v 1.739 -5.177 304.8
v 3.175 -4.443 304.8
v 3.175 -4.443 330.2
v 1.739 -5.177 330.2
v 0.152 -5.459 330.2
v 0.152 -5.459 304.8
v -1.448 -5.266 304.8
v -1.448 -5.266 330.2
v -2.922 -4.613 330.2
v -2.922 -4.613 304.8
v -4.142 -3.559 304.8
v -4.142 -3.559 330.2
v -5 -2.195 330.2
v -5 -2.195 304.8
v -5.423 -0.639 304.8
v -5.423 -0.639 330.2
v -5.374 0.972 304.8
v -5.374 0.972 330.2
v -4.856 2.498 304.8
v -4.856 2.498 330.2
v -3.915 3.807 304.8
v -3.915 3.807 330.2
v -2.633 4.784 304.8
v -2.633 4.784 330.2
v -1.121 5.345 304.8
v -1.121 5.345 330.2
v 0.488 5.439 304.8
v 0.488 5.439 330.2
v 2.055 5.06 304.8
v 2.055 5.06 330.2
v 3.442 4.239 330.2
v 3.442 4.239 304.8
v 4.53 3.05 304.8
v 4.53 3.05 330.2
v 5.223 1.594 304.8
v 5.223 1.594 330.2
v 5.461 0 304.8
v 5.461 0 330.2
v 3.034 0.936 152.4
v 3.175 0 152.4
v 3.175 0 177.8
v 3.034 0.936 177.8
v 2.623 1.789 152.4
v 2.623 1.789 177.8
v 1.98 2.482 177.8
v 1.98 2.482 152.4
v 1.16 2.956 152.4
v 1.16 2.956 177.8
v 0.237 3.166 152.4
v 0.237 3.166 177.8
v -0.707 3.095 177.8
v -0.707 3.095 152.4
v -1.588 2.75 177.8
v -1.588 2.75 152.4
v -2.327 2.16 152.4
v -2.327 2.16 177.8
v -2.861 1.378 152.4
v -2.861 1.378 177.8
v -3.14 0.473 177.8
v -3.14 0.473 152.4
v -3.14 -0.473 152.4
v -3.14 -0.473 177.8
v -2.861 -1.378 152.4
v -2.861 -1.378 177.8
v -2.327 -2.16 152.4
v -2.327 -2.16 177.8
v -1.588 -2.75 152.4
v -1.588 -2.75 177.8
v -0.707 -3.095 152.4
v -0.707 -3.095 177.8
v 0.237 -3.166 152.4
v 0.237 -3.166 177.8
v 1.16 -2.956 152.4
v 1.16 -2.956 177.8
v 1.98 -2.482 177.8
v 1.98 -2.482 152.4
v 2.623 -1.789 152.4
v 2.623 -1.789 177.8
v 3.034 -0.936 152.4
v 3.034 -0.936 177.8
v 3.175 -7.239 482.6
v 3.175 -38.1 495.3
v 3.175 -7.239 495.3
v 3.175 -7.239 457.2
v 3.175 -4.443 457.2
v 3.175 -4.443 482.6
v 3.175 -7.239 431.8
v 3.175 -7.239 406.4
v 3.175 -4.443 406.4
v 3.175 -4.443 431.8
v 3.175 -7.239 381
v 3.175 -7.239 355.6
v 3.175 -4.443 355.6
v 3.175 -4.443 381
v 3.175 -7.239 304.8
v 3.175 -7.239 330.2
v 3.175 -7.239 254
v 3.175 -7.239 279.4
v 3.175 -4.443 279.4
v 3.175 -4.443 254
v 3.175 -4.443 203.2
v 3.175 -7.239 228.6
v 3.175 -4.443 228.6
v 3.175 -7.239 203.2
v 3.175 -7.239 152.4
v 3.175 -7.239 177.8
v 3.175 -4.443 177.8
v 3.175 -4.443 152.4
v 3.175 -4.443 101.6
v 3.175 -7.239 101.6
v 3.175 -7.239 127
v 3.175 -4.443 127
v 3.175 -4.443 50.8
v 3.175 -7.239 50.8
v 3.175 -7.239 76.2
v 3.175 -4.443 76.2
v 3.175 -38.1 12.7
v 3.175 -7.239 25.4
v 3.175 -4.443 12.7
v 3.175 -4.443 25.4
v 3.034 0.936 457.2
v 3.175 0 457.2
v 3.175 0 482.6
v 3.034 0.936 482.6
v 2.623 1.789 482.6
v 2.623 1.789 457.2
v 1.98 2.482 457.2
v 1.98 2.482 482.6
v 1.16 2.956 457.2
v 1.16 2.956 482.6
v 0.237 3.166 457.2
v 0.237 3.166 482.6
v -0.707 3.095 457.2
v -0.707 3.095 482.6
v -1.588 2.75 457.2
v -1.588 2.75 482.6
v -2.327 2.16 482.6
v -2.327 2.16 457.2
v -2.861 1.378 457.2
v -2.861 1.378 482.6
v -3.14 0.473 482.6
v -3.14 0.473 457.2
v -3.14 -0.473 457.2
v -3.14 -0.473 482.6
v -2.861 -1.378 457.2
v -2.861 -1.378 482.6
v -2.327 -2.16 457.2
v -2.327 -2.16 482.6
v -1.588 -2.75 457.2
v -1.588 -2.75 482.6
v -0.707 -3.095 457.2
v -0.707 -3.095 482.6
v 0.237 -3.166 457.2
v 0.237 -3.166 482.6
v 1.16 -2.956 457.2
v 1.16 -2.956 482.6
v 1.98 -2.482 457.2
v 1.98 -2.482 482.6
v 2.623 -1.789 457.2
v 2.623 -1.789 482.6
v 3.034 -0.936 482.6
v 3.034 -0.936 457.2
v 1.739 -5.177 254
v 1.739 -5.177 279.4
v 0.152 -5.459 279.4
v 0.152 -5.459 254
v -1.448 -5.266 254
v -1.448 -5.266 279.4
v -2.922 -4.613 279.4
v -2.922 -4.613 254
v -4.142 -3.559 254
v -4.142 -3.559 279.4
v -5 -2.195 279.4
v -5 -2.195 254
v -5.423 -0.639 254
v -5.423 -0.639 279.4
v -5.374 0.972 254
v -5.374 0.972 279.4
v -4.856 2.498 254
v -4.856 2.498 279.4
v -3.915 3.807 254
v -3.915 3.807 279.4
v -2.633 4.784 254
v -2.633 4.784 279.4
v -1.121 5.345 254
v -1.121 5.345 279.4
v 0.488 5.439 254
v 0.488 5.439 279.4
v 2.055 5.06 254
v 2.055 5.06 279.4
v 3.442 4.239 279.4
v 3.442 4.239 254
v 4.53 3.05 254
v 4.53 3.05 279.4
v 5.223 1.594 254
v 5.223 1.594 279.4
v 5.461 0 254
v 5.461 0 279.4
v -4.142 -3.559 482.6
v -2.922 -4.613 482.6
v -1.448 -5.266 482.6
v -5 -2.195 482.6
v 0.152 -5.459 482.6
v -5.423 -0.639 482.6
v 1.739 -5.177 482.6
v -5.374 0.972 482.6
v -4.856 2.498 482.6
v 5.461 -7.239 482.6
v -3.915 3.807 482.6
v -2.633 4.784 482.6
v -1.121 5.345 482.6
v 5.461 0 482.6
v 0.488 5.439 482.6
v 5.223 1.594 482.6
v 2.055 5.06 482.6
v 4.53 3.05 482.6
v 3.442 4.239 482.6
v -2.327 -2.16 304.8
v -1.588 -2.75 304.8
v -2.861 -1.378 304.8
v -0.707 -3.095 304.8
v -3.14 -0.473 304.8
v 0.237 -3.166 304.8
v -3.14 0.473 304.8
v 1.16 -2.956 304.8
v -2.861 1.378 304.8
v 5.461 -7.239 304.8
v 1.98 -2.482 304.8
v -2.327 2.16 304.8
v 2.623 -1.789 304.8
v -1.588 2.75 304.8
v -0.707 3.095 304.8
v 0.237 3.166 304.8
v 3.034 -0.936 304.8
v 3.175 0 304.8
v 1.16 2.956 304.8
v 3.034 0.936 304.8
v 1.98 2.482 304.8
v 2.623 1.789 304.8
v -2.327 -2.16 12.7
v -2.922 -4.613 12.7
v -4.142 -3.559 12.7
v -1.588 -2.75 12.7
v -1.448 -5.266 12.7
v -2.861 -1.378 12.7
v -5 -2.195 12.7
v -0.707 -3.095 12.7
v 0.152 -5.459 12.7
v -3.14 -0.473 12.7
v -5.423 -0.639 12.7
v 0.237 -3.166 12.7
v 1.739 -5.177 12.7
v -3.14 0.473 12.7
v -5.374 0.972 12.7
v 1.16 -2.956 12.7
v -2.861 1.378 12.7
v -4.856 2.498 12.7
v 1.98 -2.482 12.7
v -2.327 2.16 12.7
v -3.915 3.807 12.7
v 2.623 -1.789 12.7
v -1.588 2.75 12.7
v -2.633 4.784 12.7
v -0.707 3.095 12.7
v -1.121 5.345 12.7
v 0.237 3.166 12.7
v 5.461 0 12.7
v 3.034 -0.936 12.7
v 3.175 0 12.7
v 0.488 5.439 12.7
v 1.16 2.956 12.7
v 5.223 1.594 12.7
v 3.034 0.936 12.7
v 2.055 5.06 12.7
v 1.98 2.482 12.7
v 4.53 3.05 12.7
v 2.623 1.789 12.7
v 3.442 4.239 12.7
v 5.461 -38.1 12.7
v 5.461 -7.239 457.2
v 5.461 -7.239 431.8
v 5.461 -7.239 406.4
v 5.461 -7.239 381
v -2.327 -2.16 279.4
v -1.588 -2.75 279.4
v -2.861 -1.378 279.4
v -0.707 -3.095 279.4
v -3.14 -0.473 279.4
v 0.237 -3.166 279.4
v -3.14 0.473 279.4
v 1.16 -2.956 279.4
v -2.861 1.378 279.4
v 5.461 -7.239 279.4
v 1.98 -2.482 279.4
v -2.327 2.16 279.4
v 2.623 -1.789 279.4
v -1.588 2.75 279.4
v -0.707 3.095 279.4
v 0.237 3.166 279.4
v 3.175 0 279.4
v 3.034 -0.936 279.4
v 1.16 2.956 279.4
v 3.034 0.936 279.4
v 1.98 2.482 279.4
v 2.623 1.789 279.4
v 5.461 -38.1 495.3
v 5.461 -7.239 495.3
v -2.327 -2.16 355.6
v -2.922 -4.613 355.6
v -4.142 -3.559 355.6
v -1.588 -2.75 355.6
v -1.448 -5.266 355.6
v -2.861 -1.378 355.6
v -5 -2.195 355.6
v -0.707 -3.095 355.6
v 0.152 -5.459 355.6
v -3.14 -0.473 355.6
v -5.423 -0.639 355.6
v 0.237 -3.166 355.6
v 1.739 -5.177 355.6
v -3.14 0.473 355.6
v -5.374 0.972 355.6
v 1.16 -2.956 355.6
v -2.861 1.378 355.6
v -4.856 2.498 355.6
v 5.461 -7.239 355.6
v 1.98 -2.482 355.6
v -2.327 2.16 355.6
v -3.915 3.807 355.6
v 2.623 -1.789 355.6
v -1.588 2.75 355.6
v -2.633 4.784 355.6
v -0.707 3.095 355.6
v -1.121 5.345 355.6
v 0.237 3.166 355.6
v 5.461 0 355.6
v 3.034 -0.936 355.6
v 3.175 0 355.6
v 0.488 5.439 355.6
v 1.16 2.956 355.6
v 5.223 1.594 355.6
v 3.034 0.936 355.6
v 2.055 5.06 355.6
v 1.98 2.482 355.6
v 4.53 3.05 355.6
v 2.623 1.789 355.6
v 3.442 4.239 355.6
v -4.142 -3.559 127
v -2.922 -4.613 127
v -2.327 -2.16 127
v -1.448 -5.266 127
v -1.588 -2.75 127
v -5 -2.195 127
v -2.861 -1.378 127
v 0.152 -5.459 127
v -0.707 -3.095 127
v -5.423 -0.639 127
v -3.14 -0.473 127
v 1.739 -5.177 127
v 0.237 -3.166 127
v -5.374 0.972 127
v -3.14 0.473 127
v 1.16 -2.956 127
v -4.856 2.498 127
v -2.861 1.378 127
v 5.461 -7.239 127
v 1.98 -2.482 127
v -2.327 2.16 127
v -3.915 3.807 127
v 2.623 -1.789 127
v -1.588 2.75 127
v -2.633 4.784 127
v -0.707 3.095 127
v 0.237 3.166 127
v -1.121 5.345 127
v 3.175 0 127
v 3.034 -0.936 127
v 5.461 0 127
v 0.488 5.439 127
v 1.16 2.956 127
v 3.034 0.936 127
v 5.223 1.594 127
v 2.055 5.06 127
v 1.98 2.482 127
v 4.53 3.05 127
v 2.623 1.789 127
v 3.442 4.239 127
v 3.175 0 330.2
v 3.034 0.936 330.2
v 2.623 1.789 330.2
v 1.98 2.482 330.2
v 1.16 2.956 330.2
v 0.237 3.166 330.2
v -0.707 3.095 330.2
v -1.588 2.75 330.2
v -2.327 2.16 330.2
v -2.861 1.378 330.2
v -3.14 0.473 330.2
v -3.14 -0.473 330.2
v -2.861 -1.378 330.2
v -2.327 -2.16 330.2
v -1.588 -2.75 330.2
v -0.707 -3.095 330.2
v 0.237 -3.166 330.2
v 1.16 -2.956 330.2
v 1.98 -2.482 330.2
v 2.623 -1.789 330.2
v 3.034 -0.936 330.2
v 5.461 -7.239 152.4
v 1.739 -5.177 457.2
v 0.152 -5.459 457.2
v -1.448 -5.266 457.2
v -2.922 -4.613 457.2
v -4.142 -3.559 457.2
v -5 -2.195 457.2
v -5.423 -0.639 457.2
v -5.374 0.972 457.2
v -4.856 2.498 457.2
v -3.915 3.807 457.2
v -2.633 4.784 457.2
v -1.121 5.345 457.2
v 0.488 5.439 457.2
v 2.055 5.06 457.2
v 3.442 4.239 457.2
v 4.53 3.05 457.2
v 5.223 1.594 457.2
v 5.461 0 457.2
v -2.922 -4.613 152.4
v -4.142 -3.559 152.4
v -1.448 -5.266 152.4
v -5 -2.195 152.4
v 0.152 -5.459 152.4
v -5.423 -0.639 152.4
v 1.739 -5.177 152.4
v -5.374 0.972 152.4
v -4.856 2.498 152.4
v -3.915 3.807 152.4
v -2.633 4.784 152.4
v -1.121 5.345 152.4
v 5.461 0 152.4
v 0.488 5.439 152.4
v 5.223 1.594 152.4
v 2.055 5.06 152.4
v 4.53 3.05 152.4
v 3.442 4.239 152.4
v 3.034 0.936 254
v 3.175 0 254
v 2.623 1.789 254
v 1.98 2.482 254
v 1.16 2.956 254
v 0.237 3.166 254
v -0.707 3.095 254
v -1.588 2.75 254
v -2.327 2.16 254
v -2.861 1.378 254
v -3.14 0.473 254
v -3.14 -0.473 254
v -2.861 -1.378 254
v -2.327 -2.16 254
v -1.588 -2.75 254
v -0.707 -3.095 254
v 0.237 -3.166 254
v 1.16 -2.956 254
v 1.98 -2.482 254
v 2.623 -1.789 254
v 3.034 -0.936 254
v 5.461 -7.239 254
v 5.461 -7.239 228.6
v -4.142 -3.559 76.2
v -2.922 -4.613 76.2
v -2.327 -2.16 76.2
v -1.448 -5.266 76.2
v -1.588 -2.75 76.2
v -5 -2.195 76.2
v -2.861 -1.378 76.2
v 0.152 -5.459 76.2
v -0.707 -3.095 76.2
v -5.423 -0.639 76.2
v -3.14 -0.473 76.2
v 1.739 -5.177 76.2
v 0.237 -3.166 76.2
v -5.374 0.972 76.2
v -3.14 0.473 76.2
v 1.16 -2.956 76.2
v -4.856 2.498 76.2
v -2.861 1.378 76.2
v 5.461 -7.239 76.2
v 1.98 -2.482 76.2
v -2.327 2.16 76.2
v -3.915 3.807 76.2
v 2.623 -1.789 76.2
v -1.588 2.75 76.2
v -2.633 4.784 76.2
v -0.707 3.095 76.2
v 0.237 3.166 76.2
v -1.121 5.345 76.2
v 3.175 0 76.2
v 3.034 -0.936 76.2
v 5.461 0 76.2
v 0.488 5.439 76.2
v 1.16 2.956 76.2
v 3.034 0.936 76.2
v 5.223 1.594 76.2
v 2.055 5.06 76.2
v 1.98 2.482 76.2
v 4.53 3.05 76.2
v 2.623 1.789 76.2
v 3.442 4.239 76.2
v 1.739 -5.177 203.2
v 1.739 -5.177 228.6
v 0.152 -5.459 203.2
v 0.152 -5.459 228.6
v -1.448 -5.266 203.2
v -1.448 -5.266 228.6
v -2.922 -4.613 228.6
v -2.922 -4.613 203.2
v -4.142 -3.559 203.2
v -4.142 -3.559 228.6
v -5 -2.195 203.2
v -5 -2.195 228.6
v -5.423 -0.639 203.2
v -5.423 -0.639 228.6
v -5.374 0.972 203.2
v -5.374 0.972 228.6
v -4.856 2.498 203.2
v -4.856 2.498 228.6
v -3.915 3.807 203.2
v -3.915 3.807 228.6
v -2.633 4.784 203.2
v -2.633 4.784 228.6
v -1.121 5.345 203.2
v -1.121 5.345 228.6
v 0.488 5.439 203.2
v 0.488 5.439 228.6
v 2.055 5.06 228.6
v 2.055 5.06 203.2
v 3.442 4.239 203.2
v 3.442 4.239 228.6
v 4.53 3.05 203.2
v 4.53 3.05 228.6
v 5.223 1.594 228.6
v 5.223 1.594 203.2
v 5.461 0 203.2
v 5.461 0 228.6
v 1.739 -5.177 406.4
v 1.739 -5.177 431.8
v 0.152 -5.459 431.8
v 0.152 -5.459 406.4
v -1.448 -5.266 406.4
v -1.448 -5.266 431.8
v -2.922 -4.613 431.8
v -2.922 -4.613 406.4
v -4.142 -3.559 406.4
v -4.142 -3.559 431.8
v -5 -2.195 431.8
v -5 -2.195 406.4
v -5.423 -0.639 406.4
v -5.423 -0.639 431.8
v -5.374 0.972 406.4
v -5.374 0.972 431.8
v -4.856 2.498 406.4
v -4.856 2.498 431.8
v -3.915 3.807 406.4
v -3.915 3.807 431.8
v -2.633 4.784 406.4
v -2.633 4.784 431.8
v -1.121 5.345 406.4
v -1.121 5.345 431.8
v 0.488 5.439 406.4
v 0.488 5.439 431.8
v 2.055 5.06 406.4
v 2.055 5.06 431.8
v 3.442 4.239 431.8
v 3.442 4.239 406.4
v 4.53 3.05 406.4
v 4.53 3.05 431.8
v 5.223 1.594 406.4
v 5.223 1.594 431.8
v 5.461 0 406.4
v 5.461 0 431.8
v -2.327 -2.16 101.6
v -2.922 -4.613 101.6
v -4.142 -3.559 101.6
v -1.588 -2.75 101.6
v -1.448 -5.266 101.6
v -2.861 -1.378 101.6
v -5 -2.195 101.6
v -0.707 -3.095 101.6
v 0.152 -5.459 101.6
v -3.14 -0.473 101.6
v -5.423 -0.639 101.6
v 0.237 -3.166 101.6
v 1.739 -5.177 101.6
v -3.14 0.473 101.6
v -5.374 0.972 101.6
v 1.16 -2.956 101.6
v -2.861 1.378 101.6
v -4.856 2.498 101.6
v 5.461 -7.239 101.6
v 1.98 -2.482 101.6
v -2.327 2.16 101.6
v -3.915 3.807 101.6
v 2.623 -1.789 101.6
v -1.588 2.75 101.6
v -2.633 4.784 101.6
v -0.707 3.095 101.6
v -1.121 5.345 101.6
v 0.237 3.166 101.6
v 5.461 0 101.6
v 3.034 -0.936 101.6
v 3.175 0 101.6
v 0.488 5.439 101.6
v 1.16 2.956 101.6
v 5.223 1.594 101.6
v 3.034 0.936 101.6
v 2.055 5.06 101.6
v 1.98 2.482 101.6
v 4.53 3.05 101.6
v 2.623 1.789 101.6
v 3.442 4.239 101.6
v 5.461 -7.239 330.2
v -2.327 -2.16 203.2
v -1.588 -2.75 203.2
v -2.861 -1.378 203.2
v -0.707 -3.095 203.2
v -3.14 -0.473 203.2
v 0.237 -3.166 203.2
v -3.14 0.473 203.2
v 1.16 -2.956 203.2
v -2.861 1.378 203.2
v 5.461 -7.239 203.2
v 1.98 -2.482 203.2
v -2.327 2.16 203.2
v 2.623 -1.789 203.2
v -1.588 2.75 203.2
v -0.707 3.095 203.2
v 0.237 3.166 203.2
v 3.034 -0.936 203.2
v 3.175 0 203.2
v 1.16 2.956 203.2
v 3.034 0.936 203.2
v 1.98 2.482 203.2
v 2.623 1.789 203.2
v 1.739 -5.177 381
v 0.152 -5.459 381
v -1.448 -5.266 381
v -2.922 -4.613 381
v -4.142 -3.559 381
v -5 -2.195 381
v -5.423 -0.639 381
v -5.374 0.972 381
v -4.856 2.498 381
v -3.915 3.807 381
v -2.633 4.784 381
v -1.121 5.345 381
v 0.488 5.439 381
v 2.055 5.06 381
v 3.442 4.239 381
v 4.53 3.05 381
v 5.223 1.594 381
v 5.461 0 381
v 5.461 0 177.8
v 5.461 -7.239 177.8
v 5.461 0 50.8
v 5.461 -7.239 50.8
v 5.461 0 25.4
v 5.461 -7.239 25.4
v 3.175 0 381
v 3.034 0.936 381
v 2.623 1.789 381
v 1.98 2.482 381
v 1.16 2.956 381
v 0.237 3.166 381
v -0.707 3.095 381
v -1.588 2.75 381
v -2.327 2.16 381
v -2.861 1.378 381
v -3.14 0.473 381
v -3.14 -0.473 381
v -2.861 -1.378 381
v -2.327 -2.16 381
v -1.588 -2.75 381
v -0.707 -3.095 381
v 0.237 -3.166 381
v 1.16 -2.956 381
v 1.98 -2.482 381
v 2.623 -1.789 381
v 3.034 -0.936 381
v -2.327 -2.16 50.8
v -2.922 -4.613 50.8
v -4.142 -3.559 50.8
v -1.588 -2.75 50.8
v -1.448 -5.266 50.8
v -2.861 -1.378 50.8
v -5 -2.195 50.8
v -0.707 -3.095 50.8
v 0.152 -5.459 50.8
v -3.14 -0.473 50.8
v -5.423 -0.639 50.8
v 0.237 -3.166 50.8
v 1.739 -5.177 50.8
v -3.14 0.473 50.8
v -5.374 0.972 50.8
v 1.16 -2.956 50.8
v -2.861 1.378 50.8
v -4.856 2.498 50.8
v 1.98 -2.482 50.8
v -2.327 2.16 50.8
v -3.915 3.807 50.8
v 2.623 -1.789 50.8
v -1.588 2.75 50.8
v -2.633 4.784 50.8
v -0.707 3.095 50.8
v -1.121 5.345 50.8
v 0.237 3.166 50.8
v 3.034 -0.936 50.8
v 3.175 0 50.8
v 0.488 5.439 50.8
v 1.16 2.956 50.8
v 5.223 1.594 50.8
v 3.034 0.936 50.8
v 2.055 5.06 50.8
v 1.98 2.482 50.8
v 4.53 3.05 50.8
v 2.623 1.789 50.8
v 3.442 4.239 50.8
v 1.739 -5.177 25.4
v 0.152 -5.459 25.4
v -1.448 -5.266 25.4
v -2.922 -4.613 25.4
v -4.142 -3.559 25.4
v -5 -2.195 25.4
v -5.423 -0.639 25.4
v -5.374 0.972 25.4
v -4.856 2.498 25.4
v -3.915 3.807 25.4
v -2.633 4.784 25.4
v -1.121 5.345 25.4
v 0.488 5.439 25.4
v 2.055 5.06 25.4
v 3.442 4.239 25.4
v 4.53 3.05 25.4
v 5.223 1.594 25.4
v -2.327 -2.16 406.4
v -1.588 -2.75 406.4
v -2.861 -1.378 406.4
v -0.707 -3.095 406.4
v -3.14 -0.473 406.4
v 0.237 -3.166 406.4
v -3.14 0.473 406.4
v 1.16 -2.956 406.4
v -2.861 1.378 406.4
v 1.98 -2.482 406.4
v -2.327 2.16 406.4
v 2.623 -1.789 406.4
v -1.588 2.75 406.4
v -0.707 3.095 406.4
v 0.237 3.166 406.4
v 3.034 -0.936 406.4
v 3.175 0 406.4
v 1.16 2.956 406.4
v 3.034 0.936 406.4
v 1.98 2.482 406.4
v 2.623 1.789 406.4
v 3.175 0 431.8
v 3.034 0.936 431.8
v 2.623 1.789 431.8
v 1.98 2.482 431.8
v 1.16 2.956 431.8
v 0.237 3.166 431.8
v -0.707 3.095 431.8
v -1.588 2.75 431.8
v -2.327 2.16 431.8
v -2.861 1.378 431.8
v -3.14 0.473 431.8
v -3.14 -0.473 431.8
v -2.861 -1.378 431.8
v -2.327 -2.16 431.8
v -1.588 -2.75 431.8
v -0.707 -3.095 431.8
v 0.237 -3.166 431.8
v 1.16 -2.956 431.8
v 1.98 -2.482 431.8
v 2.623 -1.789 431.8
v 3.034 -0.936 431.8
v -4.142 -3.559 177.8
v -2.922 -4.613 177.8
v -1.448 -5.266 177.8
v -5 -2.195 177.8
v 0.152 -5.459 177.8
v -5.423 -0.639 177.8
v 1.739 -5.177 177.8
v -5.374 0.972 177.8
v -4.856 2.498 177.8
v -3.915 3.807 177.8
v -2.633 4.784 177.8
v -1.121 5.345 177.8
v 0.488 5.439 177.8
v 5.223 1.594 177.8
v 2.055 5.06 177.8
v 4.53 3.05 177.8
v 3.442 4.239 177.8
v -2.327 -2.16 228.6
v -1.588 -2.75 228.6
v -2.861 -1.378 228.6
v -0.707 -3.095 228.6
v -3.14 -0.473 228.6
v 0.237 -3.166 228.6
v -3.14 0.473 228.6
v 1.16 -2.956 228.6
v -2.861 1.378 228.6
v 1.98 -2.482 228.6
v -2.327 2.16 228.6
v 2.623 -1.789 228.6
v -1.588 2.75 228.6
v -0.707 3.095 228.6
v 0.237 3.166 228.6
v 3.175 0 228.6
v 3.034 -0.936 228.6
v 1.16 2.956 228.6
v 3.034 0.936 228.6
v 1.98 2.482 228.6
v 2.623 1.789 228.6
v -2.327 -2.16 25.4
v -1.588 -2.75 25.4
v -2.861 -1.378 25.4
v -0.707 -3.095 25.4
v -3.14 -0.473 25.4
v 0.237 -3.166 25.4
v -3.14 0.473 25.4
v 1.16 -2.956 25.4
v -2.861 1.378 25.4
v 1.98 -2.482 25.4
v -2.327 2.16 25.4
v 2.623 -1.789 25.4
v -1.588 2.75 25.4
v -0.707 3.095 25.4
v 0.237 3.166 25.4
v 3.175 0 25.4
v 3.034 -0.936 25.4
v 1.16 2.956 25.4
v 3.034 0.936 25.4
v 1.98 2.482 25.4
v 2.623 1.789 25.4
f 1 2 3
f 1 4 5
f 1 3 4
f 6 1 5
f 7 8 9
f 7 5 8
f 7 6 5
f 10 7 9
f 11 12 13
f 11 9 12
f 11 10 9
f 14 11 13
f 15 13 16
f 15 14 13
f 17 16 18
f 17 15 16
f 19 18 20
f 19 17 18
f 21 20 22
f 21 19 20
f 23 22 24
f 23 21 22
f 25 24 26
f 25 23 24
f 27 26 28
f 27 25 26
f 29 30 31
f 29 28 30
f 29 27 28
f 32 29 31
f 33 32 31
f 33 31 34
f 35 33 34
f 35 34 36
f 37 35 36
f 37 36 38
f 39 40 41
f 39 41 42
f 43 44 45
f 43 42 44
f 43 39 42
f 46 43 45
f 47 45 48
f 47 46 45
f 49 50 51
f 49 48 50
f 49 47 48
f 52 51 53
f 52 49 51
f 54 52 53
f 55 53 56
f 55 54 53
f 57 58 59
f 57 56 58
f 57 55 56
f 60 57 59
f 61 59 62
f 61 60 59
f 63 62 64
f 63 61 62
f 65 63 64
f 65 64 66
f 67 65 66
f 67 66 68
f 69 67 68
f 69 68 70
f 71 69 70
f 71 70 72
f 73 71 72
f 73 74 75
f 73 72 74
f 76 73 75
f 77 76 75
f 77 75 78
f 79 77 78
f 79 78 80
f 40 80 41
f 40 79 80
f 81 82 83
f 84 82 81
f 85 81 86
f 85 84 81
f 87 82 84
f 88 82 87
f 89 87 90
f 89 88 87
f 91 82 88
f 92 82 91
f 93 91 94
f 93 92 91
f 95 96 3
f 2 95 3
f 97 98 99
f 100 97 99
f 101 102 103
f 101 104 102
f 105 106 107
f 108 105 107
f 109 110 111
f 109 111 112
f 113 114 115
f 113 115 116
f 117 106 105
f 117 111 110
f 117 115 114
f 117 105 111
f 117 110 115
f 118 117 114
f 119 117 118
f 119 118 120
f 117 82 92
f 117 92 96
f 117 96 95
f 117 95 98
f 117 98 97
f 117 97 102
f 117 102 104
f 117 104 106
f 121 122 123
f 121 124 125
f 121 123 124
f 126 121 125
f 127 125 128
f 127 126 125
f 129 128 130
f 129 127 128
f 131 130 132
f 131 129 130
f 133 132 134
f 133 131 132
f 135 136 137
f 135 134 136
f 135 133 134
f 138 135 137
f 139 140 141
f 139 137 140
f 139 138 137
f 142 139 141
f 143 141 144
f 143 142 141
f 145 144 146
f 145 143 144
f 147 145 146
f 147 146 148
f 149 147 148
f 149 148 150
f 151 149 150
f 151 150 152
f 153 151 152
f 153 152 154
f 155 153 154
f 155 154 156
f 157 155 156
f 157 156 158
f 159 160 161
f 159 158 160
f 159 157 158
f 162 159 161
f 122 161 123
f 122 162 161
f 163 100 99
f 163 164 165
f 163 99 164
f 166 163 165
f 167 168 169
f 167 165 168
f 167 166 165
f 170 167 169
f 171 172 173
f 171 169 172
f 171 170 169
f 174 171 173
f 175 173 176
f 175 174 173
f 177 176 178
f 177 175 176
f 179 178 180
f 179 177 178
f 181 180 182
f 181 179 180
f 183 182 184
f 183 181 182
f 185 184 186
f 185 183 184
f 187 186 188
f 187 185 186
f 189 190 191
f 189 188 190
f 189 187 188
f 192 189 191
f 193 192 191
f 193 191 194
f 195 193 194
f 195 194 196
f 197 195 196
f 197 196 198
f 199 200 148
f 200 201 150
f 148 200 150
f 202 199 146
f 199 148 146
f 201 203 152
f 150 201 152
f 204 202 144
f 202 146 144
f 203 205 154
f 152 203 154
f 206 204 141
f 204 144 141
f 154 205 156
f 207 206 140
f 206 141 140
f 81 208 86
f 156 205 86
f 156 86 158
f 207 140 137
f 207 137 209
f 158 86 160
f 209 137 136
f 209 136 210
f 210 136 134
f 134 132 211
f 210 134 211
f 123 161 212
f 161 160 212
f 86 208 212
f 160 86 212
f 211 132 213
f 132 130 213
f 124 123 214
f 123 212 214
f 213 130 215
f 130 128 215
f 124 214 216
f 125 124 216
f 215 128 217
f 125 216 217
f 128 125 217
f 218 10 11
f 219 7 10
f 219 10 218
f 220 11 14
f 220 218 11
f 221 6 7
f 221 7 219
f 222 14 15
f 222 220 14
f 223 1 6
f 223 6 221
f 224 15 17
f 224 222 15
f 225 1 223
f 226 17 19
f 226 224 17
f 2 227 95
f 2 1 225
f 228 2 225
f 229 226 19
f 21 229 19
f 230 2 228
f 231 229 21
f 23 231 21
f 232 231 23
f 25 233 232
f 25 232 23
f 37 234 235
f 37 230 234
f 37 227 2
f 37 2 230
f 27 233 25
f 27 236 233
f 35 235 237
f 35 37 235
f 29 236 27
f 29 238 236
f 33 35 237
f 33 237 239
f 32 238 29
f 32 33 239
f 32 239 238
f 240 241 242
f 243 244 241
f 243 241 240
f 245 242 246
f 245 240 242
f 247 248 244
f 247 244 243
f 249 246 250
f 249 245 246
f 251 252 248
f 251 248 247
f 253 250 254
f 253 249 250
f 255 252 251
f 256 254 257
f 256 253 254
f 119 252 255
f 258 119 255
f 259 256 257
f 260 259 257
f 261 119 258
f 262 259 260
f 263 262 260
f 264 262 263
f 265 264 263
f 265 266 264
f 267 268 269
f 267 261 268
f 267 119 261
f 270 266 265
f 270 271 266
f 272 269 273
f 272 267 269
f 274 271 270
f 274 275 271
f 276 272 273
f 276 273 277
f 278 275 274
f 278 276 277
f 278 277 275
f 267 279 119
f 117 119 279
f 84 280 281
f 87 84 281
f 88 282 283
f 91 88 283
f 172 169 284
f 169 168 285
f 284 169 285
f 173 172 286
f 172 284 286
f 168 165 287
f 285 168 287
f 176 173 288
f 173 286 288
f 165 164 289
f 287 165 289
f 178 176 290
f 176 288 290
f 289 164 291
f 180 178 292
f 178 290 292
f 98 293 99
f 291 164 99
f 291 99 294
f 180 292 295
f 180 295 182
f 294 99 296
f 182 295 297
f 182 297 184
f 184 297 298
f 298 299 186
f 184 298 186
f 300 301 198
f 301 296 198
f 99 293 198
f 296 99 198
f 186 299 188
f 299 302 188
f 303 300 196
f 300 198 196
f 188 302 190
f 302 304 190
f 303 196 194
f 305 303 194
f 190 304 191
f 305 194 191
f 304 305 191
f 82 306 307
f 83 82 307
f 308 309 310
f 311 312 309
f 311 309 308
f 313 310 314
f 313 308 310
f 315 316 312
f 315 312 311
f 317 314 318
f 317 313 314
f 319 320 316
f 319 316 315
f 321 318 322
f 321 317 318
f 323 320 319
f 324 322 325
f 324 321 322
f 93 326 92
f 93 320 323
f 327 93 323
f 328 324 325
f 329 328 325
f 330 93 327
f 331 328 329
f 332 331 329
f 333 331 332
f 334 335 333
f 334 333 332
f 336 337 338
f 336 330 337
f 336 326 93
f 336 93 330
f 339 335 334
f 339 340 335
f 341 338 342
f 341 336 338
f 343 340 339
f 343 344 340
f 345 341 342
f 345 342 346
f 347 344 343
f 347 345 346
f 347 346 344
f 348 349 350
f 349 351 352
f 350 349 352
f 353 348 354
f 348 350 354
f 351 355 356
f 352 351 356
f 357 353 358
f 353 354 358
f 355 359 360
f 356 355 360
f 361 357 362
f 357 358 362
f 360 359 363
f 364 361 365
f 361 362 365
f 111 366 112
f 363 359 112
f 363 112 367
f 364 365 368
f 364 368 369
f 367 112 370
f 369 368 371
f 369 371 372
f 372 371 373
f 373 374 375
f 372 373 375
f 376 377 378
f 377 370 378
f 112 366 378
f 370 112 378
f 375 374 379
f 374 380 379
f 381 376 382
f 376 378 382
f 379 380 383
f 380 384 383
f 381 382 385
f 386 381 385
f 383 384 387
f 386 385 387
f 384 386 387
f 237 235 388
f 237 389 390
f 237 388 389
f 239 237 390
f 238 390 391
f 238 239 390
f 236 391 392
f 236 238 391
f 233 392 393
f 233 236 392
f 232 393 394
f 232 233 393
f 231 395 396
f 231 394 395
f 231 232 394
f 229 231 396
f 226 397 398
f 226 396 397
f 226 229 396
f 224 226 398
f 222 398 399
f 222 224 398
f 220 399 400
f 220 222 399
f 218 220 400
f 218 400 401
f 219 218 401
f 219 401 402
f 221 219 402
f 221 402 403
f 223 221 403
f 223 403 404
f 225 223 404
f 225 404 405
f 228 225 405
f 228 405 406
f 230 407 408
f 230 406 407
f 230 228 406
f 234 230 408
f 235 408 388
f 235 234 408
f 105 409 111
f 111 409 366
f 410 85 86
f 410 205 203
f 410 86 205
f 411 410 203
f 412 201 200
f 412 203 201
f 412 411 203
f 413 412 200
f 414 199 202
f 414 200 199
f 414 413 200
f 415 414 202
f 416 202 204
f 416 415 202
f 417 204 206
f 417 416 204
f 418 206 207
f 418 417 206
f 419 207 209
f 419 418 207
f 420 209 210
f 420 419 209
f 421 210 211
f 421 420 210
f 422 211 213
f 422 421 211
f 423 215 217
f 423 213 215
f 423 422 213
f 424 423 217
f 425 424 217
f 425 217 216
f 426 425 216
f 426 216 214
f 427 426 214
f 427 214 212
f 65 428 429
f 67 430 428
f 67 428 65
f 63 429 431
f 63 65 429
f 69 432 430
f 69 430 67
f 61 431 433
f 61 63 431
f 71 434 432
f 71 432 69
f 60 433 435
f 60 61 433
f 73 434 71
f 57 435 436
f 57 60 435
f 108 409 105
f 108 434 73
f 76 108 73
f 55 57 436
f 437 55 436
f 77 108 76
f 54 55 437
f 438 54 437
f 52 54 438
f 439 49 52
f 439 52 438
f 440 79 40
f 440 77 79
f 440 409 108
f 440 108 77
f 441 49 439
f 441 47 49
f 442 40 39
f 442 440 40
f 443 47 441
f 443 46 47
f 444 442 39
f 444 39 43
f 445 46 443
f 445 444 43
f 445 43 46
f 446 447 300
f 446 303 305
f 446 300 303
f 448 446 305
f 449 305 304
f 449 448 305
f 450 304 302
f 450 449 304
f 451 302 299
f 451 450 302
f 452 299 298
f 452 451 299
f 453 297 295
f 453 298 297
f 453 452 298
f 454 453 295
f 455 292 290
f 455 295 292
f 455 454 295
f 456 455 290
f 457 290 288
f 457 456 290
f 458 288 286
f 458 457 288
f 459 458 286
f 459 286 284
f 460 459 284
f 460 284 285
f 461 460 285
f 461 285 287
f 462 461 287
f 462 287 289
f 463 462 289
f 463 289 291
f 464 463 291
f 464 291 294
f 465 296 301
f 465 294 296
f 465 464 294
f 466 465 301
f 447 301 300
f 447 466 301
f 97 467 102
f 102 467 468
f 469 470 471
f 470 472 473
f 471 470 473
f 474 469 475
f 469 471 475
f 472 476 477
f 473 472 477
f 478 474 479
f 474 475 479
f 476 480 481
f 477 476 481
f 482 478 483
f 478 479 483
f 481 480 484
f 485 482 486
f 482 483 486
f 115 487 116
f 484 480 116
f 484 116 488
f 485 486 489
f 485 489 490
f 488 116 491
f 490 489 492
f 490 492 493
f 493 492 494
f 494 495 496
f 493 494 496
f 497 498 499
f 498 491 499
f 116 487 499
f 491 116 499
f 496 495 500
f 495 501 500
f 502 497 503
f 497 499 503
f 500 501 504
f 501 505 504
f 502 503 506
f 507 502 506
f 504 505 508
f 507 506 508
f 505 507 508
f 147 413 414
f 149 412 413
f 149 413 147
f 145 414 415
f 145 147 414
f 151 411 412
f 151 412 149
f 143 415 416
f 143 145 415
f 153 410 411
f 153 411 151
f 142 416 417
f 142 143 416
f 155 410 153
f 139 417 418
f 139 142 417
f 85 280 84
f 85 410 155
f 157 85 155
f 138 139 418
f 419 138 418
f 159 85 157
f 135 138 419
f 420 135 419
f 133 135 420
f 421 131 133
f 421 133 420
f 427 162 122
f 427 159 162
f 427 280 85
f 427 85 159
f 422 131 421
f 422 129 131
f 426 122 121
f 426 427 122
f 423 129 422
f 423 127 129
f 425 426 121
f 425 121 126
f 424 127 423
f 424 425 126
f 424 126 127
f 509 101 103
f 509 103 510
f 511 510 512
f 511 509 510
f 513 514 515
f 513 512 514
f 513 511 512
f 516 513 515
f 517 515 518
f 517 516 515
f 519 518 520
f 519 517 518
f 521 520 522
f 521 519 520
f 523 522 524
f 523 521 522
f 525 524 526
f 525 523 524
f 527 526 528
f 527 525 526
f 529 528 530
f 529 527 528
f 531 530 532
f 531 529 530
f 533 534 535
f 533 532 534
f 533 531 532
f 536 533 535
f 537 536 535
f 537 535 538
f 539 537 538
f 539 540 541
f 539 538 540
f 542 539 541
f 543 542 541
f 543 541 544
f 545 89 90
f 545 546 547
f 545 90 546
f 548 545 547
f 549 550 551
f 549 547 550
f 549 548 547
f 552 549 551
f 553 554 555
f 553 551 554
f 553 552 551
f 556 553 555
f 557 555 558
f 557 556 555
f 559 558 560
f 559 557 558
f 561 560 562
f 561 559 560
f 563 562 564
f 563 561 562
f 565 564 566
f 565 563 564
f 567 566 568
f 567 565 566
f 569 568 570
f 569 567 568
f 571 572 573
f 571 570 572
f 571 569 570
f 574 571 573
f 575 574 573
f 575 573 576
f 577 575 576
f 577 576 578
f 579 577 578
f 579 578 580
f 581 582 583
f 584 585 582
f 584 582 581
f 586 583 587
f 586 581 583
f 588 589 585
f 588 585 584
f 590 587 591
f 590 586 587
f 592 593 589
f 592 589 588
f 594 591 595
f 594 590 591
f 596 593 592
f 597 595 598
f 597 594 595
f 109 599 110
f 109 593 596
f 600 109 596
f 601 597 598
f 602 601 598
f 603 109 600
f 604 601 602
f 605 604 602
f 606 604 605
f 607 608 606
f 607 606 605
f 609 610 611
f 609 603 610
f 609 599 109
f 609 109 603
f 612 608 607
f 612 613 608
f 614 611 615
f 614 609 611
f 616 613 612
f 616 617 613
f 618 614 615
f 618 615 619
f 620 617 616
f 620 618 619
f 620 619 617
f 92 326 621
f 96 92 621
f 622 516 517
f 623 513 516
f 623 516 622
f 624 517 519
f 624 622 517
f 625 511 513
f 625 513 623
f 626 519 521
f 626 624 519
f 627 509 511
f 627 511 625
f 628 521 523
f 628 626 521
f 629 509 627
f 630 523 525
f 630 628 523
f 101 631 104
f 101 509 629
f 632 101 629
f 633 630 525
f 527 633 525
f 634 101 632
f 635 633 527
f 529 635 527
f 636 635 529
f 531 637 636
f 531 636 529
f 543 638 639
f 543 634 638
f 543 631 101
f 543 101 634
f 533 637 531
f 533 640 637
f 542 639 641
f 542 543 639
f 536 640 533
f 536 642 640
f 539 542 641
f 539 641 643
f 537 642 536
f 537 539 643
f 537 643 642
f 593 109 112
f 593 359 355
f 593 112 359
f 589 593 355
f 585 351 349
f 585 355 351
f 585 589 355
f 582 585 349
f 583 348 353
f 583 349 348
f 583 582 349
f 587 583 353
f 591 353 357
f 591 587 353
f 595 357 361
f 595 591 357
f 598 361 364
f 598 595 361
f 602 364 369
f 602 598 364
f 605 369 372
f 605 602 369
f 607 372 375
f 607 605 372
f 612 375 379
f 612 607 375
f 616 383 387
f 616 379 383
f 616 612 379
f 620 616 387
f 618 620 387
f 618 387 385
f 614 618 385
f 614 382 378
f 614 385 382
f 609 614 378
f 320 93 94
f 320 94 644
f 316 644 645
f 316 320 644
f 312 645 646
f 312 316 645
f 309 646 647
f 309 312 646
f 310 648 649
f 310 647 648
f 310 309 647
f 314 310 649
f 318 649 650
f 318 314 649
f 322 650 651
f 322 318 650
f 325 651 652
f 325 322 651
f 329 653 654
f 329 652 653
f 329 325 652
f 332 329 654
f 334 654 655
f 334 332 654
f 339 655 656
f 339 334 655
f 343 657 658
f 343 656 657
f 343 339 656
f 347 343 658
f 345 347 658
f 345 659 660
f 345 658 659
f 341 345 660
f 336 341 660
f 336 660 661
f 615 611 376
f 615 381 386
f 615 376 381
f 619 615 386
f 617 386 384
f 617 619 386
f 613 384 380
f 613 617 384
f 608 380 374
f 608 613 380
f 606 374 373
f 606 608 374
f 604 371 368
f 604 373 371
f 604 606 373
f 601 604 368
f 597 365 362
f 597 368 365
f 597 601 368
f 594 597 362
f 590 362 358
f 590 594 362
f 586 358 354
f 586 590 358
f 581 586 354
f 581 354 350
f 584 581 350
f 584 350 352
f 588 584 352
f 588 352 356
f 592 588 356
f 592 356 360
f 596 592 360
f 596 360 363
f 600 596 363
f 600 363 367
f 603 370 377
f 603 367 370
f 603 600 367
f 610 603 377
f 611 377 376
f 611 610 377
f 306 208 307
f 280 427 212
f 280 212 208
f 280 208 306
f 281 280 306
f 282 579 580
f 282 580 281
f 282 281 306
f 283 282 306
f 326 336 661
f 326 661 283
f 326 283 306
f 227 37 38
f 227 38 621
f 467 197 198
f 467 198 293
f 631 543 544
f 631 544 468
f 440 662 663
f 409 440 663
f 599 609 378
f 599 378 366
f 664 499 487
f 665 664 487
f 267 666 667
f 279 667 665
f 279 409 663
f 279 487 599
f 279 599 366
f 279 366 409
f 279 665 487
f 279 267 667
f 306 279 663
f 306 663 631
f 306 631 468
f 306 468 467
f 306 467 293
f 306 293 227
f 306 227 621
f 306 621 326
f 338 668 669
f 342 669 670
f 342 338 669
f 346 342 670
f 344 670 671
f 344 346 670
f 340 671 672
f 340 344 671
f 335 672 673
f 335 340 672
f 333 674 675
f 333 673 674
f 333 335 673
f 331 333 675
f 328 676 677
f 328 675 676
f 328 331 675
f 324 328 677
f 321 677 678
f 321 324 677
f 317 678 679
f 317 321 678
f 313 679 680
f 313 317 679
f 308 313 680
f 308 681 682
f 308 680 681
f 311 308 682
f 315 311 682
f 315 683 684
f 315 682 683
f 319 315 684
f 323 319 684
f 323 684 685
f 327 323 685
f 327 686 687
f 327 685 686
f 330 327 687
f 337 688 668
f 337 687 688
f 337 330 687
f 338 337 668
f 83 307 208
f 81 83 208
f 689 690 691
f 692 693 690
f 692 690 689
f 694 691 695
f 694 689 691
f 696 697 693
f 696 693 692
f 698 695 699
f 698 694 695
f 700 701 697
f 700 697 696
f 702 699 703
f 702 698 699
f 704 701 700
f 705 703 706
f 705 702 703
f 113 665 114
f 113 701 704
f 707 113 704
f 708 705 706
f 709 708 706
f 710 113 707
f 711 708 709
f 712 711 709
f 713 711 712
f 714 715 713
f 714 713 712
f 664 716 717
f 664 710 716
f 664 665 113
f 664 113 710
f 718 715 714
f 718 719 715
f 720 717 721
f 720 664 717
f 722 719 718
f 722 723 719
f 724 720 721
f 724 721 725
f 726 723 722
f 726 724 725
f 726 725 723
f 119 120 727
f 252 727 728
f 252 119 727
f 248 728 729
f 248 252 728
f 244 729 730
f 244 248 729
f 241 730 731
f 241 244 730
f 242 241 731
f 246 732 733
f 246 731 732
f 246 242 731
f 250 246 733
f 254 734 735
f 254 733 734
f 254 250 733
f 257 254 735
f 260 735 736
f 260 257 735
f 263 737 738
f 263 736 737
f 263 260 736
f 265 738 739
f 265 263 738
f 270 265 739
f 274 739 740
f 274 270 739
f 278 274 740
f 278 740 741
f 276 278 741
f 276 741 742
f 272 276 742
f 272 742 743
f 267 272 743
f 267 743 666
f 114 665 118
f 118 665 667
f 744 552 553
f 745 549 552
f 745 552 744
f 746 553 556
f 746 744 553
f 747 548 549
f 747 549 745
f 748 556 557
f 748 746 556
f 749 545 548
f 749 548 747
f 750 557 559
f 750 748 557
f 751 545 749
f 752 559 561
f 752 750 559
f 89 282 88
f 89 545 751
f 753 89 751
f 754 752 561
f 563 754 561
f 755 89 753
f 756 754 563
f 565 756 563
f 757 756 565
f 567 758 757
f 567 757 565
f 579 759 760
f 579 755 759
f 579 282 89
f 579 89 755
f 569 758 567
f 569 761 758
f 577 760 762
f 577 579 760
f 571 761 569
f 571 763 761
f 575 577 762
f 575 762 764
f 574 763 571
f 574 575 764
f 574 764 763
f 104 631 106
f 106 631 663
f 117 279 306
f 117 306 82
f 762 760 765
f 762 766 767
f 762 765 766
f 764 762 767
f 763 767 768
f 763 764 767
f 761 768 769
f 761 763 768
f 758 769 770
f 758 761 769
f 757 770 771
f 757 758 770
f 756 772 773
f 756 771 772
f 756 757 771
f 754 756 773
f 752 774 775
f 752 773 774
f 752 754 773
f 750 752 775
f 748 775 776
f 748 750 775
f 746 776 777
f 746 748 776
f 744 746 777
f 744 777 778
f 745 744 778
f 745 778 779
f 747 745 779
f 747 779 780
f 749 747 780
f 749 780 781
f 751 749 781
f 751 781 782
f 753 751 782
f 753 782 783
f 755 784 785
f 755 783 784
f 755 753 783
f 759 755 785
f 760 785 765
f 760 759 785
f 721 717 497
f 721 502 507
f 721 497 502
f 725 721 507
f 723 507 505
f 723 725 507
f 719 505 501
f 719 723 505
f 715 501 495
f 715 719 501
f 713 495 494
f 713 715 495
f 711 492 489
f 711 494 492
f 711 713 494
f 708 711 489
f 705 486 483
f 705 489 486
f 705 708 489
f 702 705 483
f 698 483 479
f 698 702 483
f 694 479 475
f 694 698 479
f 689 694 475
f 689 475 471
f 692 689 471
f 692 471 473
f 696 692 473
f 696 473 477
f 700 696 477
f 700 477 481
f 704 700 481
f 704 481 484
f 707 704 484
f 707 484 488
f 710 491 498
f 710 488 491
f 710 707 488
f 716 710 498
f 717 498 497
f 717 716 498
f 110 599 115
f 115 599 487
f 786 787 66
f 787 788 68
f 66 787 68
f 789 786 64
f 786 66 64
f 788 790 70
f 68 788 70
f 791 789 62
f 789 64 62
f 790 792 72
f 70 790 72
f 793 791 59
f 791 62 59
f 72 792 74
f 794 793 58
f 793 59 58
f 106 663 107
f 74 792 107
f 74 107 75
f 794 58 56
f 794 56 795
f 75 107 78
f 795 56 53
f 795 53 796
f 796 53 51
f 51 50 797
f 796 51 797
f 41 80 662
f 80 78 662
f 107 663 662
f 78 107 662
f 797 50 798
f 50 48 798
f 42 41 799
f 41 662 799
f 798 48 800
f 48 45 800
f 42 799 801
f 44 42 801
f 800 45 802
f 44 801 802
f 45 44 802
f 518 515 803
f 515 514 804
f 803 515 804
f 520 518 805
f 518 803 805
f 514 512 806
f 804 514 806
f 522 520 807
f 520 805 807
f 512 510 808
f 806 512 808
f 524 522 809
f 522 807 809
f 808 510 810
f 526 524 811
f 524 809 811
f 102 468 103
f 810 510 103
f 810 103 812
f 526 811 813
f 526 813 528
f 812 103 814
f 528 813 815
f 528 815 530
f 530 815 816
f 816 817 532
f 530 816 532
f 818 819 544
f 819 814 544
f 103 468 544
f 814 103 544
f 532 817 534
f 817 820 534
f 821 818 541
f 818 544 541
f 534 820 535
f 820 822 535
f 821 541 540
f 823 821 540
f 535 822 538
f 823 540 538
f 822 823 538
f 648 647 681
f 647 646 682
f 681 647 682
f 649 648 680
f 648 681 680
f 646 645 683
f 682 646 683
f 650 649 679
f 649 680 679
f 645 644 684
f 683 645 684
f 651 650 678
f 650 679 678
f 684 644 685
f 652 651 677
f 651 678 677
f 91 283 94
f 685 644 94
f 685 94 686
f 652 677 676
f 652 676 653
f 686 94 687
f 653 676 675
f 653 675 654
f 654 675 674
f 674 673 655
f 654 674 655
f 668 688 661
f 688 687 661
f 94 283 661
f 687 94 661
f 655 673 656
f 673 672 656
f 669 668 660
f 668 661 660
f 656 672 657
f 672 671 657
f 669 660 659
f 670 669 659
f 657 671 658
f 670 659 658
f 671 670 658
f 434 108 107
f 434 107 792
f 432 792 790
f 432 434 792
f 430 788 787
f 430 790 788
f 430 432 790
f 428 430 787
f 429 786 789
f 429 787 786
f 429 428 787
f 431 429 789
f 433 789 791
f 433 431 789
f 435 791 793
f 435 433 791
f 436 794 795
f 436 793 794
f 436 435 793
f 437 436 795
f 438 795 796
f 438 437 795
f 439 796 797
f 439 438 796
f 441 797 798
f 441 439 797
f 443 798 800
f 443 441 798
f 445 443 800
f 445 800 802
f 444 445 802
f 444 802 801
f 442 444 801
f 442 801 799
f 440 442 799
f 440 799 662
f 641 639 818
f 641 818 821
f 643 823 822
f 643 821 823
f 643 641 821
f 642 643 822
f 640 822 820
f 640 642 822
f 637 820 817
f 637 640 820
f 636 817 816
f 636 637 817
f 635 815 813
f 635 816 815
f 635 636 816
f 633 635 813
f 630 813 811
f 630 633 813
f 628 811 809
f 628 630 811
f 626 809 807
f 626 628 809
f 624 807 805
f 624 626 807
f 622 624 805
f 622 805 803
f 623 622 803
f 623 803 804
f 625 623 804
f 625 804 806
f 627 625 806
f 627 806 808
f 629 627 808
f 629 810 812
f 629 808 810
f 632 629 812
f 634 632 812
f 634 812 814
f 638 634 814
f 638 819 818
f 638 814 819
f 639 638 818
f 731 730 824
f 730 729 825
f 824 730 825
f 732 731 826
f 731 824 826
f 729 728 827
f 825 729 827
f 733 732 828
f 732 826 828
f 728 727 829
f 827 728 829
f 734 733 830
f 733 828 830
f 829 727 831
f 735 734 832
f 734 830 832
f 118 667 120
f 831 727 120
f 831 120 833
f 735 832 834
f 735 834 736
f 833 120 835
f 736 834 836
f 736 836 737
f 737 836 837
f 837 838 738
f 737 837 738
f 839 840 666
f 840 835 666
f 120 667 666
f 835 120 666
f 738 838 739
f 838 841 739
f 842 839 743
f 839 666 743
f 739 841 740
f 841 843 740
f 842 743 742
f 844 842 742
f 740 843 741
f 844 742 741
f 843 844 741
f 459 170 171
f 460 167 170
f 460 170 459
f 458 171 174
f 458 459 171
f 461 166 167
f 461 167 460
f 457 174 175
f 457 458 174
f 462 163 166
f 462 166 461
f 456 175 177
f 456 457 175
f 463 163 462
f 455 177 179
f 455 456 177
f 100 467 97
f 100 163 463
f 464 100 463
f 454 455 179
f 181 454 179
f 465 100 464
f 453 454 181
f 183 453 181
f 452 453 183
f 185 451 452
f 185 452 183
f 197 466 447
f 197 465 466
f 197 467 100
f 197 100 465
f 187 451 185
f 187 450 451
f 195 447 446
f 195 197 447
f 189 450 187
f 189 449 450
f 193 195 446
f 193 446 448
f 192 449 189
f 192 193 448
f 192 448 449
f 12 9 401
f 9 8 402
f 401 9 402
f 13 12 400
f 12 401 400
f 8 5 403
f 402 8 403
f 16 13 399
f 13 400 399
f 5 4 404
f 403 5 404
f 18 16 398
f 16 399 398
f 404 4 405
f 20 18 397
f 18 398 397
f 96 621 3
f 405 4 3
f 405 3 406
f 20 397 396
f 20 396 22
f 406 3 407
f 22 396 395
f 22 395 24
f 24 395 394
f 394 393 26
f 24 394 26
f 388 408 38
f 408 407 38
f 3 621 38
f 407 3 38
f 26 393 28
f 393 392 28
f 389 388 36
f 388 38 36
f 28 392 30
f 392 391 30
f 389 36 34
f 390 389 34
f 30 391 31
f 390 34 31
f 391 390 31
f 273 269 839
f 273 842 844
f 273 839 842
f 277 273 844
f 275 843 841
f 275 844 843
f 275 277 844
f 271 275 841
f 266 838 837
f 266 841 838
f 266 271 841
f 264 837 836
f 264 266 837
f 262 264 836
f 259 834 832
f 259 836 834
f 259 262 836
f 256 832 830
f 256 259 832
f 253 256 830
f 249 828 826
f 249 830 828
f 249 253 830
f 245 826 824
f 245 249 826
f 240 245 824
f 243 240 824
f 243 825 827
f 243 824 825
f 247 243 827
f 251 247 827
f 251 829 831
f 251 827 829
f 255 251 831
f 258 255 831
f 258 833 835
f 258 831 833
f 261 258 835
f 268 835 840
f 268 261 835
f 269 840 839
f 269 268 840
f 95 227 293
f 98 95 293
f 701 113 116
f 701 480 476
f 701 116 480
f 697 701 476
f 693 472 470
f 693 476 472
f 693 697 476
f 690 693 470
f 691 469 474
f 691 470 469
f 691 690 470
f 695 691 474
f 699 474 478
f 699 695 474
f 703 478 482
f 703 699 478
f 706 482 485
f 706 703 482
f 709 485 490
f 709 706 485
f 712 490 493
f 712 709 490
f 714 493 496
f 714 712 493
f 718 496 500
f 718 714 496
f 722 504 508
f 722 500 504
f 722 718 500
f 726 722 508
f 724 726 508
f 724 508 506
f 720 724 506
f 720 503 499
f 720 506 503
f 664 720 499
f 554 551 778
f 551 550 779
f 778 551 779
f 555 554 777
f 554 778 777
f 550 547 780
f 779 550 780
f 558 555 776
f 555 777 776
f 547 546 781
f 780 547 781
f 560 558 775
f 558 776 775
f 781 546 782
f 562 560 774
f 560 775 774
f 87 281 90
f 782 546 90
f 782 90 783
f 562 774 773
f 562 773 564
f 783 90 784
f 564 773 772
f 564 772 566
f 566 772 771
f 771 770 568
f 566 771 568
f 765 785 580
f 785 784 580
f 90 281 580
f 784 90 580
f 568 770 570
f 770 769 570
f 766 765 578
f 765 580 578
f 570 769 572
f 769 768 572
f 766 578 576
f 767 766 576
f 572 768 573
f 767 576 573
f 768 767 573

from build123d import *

# Parameters (mm, degrees)
SKETCH1_R           = 3.175
BOSS_EXTRUDE1_DEPTH = 508
SKETCH2_W           = 25.4
SKETCH2_H           = 12.7
CUT_EXTRUDE1_DEPTH  = 11.922
LPATTERN1_COUNT     = 10
LPATTERN1_PITCH     = 50.8
SKETCH4_W           = 12.7
SKETCH4_H           = 30.861
SKETCH4_H_2         = 43.561
CUT_EXTRUDE2_DEPTH  = 11.922


with BuildPart() as part:
    # Sketch1 → Boss-Extrude1 (new body)
    with BuildSketch(Plane.XY):
        with BuildLine():
            Line((5.461, 0), (5.461, -38.1))
            Line((5.461, -38.1), (3.175, -38.1))
            Line((3.175, -38.1), (3.175, -4.443185344))
            ThreePointArc((3.175, -4.443185344), (-4.855985791, 2.498384078), (5.461, 0))
        make_face()
        Circle(SKETCH1_R, mode=Mode.SUBTRACT)
    extrude(amount=BOSS_EXTRUDE1_DEPTH)

    # Sketch2 → Cut-Extrude1 (cut, through all)
    with BuildSketch(Plane(origin=(5.461, 0, 0), x_dir=(0, 0, -1), z_dir=(1, 0, 0))):
        with Locations((-495.3, -0.889)):
            Rectangle(SKETCH2_W, SKETCH2_H)
    cut_extrude1 = extrude(amount=-CUT_EXTRUDE1_DEPTH, mode=Mode.SUBTRACT)

    # LPattern1: Cut-Extrude1 ×10
    with Locations(*[(0, 0, -i * LPATTERN1_PITCH) for i in range(1, LPATTERN1_COUNT)]):
        add(cut_extrude1, mode=Mode.SUBTRACT)

    # Sketch4 → Cut-Extrude2 (cut, through all)
    with BuildSketch(Plane(origin=(5.461, 0, 0), x_dir=(0, 0, -1), z_dir=(1, 0, 0))):
        with Locations((-501.65, -22.6695)):
            Rectangle(SKETCH4_W, SKETCH4_H)
        with Locations((-6.35, -16.3195)):
            Rectangle(SKETCH4_W, SKETCH4_H_2)
    extrude(amount=-CUT_EXTRUDE2_DEPTH, mode=Mode.SUBTRACT)


solid = part.part
